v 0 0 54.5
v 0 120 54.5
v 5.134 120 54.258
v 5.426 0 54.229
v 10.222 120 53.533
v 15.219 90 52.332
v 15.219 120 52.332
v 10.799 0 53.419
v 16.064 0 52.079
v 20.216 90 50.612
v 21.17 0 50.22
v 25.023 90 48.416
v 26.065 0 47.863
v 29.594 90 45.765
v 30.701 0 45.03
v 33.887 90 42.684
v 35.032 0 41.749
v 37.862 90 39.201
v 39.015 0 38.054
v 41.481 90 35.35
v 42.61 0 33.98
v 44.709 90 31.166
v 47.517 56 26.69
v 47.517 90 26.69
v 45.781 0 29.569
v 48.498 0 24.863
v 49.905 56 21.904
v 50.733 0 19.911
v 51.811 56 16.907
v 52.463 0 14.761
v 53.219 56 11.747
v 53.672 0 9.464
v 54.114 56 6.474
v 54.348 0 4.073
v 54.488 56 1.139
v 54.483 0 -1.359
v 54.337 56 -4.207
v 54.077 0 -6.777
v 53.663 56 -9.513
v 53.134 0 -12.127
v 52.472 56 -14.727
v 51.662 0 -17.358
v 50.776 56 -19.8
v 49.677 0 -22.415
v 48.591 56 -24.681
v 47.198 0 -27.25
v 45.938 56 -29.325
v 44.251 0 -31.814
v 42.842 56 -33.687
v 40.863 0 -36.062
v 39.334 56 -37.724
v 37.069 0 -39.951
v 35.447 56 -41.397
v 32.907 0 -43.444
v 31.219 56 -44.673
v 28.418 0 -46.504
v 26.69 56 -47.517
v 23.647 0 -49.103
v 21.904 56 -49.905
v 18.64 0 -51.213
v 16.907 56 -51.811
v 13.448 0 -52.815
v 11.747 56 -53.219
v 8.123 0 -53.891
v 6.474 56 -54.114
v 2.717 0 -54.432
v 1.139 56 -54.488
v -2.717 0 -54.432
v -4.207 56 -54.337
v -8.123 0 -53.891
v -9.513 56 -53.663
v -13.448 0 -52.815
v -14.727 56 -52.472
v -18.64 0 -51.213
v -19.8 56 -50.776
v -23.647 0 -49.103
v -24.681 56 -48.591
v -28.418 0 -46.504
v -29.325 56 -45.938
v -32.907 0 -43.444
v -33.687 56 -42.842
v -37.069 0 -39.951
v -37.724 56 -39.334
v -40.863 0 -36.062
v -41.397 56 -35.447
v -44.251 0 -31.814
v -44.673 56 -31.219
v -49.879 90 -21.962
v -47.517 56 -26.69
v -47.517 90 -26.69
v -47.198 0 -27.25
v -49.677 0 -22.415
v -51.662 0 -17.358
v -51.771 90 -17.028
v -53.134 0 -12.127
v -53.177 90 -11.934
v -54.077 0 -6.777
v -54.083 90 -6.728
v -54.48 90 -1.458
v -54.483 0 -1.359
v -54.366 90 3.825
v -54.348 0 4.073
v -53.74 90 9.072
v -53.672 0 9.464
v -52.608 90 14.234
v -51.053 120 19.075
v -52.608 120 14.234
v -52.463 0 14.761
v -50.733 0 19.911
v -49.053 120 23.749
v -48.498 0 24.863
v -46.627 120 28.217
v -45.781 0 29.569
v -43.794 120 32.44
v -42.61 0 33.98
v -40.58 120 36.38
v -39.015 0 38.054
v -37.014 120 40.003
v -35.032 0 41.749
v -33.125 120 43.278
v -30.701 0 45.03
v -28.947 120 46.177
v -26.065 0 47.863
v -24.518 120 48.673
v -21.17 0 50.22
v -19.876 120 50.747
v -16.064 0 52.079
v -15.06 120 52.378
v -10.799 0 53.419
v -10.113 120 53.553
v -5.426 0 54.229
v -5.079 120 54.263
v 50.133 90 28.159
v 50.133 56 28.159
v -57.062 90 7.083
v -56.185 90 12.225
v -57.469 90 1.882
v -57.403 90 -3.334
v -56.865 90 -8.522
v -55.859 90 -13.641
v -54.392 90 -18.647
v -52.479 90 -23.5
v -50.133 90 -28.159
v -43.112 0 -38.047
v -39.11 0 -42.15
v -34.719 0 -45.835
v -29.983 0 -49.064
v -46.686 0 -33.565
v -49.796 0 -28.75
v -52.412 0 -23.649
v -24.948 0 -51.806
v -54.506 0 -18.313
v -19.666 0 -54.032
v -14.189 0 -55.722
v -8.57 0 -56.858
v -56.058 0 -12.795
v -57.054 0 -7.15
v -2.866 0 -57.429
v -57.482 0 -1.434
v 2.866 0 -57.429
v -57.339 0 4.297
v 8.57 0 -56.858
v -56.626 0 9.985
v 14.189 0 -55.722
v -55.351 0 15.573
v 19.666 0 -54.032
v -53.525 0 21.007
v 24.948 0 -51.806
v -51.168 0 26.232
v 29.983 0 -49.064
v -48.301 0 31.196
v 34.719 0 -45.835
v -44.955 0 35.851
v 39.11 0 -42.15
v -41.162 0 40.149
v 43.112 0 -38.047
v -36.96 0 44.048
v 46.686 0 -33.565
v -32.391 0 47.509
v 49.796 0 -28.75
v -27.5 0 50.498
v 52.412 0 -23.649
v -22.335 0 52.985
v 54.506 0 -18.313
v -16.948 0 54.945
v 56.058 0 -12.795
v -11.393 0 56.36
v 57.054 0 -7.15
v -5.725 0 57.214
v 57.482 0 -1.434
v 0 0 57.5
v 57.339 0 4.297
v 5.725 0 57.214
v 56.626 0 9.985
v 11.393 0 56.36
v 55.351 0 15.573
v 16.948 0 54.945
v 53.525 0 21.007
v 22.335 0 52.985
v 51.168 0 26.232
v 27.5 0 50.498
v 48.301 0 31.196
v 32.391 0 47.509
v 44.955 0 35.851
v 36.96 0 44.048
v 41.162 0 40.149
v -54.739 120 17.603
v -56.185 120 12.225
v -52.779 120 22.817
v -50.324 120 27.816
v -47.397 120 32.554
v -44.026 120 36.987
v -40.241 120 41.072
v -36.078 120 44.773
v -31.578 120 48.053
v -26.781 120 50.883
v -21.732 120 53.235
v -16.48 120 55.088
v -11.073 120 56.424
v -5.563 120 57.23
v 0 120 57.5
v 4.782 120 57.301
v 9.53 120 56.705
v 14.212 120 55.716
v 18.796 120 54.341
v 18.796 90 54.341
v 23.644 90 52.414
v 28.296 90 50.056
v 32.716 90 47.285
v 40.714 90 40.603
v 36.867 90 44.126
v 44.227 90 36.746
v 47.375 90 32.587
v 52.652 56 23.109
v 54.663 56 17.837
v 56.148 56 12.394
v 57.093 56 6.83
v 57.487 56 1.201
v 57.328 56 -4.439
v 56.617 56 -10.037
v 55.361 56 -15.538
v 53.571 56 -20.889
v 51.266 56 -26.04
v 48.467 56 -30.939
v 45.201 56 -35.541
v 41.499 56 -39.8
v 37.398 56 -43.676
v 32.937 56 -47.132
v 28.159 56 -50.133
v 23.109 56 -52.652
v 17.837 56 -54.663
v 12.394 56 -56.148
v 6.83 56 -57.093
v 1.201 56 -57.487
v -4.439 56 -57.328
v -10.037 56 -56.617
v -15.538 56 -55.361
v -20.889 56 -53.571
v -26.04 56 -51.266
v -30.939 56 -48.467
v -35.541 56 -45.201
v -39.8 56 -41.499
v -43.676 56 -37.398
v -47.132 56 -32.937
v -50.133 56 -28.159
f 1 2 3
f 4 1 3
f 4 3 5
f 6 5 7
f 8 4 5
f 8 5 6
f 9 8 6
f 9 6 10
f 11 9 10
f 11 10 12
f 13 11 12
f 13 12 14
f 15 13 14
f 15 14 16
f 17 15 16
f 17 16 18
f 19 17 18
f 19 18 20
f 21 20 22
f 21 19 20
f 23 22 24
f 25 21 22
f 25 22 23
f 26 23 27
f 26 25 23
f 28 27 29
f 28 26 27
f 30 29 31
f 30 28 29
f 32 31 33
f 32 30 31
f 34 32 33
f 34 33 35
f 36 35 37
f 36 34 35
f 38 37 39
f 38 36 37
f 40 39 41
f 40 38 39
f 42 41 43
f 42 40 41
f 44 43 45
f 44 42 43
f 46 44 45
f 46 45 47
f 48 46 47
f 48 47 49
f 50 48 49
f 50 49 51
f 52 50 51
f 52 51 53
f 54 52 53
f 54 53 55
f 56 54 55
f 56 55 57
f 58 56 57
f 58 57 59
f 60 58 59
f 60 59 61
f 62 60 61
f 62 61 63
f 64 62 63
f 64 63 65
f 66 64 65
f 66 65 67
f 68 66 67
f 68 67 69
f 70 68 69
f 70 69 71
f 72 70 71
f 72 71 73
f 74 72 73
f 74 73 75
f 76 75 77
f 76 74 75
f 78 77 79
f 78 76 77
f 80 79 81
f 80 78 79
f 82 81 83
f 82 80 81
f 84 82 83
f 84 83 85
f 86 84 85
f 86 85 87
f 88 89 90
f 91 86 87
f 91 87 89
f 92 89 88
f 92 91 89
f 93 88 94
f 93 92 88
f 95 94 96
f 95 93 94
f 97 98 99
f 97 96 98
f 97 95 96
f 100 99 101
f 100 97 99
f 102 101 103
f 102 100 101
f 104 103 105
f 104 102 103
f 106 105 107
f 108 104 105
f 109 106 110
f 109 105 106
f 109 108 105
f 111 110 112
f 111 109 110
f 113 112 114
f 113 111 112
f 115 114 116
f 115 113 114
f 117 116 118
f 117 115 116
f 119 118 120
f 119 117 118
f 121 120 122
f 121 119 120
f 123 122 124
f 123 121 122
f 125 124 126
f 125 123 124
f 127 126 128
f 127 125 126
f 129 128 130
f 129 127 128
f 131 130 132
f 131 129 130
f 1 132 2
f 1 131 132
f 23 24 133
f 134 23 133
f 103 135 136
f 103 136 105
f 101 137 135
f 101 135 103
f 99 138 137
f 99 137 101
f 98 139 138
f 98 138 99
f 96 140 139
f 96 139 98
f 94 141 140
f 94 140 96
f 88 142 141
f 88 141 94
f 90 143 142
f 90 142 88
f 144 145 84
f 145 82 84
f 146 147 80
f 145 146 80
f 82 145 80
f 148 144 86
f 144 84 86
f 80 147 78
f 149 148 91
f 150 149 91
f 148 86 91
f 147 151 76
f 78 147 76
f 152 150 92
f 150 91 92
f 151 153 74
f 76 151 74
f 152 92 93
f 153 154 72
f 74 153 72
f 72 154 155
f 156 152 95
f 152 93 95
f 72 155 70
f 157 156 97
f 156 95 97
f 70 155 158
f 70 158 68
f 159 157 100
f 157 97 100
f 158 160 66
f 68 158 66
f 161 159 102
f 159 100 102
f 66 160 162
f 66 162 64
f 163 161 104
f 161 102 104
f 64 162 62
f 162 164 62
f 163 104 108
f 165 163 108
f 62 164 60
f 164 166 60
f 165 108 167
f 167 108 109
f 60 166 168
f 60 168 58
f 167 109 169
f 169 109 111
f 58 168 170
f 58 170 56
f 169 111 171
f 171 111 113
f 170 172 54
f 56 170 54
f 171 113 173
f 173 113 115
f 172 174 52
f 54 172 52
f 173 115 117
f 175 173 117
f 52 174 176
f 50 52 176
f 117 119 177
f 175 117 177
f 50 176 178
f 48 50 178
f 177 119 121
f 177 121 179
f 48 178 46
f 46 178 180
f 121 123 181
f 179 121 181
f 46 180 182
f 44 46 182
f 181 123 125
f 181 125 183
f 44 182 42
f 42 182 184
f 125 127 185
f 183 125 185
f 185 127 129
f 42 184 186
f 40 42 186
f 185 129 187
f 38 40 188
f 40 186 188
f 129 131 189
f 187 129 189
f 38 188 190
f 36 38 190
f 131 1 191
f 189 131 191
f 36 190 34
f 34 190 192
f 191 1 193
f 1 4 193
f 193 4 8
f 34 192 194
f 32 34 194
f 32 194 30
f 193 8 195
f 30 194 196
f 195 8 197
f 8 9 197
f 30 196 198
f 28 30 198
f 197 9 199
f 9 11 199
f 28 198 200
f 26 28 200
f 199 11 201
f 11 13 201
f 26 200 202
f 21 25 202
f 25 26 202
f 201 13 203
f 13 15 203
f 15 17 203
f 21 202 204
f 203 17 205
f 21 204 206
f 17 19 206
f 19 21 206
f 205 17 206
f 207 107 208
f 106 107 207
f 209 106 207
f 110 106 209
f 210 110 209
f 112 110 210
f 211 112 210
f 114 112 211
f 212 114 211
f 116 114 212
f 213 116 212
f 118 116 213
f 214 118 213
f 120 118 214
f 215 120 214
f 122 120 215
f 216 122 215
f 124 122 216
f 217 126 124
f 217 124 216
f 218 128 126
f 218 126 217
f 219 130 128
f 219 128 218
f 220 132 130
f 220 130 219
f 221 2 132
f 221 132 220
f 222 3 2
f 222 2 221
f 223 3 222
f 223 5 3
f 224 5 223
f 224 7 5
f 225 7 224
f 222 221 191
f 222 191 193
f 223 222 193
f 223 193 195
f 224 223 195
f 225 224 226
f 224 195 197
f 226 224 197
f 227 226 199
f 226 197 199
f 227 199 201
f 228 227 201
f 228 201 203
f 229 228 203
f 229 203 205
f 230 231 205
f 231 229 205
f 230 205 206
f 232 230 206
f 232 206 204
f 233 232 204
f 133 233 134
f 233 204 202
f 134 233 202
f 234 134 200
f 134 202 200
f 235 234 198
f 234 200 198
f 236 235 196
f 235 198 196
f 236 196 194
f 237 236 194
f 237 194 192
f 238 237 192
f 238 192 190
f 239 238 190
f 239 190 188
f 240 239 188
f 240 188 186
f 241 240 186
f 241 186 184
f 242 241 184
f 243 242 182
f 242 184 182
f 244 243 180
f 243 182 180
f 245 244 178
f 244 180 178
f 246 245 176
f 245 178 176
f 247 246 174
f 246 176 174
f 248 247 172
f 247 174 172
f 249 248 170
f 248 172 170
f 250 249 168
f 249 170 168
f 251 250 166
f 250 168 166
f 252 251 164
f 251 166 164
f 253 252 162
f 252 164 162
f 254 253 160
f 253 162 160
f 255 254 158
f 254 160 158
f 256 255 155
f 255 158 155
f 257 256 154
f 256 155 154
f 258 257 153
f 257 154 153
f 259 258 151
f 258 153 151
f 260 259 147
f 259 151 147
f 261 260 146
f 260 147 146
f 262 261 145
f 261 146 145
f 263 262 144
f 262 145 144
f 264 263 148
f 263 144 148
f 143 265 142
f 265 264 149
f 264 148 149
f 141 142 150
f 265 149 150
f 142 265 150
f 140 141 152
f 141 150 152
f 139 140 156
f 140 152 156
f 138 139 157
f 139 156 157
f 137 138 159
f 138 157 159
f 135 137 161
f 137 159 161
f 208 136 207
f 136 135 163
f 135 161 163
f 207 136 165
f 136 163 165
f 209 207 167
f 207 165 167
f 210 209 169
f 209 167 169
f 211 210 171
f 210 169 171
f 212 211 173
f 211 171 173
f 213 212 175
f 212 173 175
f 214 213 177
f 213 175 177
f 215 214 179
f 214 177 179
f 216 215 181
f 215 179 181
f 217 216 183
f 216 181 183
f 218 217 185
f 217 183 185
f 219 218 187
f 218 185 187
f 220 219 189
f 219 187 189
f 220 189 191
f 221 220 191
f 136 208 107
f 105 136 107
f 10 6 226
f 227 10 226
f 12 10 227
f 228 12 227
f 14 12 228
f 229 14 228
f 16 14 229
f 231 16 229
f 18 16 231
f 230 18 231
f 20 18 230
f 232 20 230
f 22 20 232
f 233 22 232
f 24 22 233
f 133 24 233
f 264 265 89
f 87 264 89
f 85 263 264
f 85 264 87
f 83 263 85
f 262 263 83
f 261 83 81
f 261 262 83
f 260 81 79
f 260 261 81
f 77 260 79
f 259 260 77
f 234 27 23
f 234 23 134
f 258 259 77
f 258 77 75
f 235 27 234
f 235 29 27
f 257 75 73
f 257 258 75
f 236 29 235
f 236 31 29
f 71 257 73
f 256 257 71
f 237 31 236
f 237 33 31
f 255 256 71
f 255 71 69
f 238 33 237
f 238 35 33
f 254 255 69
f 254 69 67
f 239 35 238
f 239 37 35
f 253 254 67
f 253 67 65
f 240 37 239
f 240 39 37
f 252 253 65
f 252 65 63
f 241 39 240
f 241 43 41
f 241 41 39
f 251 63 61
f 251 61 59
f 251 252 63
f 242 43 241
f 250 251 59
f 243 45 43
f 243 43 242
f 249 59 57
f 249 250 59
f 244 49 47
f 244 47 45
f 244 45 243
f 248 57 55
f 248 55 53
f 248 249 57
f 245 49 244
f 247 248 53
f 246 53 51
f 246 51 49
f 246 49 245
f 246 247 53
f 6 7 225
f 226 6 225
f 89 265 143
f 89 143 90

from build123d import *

# Parameters (mm, degrees)
SKETCH1_R           = 57.5
SKETCH1_R_2         = 54.5
BOSS_EXTRUDE1_DEPTH = 120
SKETCH4_OUTSIDE_W   = 157.422
SKETCH4_OUTSIDE_H   = 157.422
CUT_EXTRUDE1_DEPTH  = 64
SKETCH5_OUTSIDE_W   = 157.422
SKETCH5_OUTSIDE_H   = 157.422
CUT_EXTRUDE2_DEPTH  = 30


with BuildPart() as part:
    # Sketch1 → Boss-Extrude1 (new body)
    with BuildSketch(Plane(origin=(0, 0, 0), x_dir=(1, 0, 0), z_dir=(0, 1, 0))):
        with Locations(Location((0, 0, 0), (0, 0, 270))):
            Circle(SKETCH1_R)
        with Locations(Location((0, 0, 0), (0, 0, 270))):
            Circle(SKETCH1_R_2, mode=Mode.SUBTRACT)
    extrude(amount=BOSS_EXTRUDE1_DEPTH)

    # Sketch4 outside → Cut-Extrude1 (cut)
    with BuildSketch(Plane(origin=(0, 120, 0), x_dir=(1, 0, 0), z_dir=(0, 1, 0))):
        Rectangle(SKETCH4_OUTSIDE_W, SKETCH4_OUTSIDE_H)
        with BuildLine():
            Line((-50.133042419, 28.158978281), (50.133042419, -28.158978281))
            ThreePointArc((50.133042419, -28.158978281), (-28.158978281, -50.133042419), (-50.133042419, 28.158978281))
        make_face(mode=Mode.SUBTRACT)
    extrude(amount=-CUT_EXTRUDE1_DEPTH, mode=Mode.SUBTRACT)

    # Sketch5 outside → Cut-Extrude2 (cut)
    with BuildSketch(Plane(origin=(0, 120, 0), x_dir=(1, 0, 0), z_dir=(0, 1, 0))):
        Rectangle(SKETCH5_OUTSIDE_W, SKETCH5_OUTSIDE_H)
        with BuildLine():
            Line((-56.185392762, -12.22504152), (18.796201116, -54.341078602))
            ThreePointArc((18.796201116, -54.341078602), (-28.158978281, -50.133042419), (-56.185392762, -12.22504152))
        make_face(mode=Mode.SUBTRACT)
    extrude(amount=-CUT_EXTRUDE2_DEPTH, mode=Mode.SUBTRACT)


solid = part.part
